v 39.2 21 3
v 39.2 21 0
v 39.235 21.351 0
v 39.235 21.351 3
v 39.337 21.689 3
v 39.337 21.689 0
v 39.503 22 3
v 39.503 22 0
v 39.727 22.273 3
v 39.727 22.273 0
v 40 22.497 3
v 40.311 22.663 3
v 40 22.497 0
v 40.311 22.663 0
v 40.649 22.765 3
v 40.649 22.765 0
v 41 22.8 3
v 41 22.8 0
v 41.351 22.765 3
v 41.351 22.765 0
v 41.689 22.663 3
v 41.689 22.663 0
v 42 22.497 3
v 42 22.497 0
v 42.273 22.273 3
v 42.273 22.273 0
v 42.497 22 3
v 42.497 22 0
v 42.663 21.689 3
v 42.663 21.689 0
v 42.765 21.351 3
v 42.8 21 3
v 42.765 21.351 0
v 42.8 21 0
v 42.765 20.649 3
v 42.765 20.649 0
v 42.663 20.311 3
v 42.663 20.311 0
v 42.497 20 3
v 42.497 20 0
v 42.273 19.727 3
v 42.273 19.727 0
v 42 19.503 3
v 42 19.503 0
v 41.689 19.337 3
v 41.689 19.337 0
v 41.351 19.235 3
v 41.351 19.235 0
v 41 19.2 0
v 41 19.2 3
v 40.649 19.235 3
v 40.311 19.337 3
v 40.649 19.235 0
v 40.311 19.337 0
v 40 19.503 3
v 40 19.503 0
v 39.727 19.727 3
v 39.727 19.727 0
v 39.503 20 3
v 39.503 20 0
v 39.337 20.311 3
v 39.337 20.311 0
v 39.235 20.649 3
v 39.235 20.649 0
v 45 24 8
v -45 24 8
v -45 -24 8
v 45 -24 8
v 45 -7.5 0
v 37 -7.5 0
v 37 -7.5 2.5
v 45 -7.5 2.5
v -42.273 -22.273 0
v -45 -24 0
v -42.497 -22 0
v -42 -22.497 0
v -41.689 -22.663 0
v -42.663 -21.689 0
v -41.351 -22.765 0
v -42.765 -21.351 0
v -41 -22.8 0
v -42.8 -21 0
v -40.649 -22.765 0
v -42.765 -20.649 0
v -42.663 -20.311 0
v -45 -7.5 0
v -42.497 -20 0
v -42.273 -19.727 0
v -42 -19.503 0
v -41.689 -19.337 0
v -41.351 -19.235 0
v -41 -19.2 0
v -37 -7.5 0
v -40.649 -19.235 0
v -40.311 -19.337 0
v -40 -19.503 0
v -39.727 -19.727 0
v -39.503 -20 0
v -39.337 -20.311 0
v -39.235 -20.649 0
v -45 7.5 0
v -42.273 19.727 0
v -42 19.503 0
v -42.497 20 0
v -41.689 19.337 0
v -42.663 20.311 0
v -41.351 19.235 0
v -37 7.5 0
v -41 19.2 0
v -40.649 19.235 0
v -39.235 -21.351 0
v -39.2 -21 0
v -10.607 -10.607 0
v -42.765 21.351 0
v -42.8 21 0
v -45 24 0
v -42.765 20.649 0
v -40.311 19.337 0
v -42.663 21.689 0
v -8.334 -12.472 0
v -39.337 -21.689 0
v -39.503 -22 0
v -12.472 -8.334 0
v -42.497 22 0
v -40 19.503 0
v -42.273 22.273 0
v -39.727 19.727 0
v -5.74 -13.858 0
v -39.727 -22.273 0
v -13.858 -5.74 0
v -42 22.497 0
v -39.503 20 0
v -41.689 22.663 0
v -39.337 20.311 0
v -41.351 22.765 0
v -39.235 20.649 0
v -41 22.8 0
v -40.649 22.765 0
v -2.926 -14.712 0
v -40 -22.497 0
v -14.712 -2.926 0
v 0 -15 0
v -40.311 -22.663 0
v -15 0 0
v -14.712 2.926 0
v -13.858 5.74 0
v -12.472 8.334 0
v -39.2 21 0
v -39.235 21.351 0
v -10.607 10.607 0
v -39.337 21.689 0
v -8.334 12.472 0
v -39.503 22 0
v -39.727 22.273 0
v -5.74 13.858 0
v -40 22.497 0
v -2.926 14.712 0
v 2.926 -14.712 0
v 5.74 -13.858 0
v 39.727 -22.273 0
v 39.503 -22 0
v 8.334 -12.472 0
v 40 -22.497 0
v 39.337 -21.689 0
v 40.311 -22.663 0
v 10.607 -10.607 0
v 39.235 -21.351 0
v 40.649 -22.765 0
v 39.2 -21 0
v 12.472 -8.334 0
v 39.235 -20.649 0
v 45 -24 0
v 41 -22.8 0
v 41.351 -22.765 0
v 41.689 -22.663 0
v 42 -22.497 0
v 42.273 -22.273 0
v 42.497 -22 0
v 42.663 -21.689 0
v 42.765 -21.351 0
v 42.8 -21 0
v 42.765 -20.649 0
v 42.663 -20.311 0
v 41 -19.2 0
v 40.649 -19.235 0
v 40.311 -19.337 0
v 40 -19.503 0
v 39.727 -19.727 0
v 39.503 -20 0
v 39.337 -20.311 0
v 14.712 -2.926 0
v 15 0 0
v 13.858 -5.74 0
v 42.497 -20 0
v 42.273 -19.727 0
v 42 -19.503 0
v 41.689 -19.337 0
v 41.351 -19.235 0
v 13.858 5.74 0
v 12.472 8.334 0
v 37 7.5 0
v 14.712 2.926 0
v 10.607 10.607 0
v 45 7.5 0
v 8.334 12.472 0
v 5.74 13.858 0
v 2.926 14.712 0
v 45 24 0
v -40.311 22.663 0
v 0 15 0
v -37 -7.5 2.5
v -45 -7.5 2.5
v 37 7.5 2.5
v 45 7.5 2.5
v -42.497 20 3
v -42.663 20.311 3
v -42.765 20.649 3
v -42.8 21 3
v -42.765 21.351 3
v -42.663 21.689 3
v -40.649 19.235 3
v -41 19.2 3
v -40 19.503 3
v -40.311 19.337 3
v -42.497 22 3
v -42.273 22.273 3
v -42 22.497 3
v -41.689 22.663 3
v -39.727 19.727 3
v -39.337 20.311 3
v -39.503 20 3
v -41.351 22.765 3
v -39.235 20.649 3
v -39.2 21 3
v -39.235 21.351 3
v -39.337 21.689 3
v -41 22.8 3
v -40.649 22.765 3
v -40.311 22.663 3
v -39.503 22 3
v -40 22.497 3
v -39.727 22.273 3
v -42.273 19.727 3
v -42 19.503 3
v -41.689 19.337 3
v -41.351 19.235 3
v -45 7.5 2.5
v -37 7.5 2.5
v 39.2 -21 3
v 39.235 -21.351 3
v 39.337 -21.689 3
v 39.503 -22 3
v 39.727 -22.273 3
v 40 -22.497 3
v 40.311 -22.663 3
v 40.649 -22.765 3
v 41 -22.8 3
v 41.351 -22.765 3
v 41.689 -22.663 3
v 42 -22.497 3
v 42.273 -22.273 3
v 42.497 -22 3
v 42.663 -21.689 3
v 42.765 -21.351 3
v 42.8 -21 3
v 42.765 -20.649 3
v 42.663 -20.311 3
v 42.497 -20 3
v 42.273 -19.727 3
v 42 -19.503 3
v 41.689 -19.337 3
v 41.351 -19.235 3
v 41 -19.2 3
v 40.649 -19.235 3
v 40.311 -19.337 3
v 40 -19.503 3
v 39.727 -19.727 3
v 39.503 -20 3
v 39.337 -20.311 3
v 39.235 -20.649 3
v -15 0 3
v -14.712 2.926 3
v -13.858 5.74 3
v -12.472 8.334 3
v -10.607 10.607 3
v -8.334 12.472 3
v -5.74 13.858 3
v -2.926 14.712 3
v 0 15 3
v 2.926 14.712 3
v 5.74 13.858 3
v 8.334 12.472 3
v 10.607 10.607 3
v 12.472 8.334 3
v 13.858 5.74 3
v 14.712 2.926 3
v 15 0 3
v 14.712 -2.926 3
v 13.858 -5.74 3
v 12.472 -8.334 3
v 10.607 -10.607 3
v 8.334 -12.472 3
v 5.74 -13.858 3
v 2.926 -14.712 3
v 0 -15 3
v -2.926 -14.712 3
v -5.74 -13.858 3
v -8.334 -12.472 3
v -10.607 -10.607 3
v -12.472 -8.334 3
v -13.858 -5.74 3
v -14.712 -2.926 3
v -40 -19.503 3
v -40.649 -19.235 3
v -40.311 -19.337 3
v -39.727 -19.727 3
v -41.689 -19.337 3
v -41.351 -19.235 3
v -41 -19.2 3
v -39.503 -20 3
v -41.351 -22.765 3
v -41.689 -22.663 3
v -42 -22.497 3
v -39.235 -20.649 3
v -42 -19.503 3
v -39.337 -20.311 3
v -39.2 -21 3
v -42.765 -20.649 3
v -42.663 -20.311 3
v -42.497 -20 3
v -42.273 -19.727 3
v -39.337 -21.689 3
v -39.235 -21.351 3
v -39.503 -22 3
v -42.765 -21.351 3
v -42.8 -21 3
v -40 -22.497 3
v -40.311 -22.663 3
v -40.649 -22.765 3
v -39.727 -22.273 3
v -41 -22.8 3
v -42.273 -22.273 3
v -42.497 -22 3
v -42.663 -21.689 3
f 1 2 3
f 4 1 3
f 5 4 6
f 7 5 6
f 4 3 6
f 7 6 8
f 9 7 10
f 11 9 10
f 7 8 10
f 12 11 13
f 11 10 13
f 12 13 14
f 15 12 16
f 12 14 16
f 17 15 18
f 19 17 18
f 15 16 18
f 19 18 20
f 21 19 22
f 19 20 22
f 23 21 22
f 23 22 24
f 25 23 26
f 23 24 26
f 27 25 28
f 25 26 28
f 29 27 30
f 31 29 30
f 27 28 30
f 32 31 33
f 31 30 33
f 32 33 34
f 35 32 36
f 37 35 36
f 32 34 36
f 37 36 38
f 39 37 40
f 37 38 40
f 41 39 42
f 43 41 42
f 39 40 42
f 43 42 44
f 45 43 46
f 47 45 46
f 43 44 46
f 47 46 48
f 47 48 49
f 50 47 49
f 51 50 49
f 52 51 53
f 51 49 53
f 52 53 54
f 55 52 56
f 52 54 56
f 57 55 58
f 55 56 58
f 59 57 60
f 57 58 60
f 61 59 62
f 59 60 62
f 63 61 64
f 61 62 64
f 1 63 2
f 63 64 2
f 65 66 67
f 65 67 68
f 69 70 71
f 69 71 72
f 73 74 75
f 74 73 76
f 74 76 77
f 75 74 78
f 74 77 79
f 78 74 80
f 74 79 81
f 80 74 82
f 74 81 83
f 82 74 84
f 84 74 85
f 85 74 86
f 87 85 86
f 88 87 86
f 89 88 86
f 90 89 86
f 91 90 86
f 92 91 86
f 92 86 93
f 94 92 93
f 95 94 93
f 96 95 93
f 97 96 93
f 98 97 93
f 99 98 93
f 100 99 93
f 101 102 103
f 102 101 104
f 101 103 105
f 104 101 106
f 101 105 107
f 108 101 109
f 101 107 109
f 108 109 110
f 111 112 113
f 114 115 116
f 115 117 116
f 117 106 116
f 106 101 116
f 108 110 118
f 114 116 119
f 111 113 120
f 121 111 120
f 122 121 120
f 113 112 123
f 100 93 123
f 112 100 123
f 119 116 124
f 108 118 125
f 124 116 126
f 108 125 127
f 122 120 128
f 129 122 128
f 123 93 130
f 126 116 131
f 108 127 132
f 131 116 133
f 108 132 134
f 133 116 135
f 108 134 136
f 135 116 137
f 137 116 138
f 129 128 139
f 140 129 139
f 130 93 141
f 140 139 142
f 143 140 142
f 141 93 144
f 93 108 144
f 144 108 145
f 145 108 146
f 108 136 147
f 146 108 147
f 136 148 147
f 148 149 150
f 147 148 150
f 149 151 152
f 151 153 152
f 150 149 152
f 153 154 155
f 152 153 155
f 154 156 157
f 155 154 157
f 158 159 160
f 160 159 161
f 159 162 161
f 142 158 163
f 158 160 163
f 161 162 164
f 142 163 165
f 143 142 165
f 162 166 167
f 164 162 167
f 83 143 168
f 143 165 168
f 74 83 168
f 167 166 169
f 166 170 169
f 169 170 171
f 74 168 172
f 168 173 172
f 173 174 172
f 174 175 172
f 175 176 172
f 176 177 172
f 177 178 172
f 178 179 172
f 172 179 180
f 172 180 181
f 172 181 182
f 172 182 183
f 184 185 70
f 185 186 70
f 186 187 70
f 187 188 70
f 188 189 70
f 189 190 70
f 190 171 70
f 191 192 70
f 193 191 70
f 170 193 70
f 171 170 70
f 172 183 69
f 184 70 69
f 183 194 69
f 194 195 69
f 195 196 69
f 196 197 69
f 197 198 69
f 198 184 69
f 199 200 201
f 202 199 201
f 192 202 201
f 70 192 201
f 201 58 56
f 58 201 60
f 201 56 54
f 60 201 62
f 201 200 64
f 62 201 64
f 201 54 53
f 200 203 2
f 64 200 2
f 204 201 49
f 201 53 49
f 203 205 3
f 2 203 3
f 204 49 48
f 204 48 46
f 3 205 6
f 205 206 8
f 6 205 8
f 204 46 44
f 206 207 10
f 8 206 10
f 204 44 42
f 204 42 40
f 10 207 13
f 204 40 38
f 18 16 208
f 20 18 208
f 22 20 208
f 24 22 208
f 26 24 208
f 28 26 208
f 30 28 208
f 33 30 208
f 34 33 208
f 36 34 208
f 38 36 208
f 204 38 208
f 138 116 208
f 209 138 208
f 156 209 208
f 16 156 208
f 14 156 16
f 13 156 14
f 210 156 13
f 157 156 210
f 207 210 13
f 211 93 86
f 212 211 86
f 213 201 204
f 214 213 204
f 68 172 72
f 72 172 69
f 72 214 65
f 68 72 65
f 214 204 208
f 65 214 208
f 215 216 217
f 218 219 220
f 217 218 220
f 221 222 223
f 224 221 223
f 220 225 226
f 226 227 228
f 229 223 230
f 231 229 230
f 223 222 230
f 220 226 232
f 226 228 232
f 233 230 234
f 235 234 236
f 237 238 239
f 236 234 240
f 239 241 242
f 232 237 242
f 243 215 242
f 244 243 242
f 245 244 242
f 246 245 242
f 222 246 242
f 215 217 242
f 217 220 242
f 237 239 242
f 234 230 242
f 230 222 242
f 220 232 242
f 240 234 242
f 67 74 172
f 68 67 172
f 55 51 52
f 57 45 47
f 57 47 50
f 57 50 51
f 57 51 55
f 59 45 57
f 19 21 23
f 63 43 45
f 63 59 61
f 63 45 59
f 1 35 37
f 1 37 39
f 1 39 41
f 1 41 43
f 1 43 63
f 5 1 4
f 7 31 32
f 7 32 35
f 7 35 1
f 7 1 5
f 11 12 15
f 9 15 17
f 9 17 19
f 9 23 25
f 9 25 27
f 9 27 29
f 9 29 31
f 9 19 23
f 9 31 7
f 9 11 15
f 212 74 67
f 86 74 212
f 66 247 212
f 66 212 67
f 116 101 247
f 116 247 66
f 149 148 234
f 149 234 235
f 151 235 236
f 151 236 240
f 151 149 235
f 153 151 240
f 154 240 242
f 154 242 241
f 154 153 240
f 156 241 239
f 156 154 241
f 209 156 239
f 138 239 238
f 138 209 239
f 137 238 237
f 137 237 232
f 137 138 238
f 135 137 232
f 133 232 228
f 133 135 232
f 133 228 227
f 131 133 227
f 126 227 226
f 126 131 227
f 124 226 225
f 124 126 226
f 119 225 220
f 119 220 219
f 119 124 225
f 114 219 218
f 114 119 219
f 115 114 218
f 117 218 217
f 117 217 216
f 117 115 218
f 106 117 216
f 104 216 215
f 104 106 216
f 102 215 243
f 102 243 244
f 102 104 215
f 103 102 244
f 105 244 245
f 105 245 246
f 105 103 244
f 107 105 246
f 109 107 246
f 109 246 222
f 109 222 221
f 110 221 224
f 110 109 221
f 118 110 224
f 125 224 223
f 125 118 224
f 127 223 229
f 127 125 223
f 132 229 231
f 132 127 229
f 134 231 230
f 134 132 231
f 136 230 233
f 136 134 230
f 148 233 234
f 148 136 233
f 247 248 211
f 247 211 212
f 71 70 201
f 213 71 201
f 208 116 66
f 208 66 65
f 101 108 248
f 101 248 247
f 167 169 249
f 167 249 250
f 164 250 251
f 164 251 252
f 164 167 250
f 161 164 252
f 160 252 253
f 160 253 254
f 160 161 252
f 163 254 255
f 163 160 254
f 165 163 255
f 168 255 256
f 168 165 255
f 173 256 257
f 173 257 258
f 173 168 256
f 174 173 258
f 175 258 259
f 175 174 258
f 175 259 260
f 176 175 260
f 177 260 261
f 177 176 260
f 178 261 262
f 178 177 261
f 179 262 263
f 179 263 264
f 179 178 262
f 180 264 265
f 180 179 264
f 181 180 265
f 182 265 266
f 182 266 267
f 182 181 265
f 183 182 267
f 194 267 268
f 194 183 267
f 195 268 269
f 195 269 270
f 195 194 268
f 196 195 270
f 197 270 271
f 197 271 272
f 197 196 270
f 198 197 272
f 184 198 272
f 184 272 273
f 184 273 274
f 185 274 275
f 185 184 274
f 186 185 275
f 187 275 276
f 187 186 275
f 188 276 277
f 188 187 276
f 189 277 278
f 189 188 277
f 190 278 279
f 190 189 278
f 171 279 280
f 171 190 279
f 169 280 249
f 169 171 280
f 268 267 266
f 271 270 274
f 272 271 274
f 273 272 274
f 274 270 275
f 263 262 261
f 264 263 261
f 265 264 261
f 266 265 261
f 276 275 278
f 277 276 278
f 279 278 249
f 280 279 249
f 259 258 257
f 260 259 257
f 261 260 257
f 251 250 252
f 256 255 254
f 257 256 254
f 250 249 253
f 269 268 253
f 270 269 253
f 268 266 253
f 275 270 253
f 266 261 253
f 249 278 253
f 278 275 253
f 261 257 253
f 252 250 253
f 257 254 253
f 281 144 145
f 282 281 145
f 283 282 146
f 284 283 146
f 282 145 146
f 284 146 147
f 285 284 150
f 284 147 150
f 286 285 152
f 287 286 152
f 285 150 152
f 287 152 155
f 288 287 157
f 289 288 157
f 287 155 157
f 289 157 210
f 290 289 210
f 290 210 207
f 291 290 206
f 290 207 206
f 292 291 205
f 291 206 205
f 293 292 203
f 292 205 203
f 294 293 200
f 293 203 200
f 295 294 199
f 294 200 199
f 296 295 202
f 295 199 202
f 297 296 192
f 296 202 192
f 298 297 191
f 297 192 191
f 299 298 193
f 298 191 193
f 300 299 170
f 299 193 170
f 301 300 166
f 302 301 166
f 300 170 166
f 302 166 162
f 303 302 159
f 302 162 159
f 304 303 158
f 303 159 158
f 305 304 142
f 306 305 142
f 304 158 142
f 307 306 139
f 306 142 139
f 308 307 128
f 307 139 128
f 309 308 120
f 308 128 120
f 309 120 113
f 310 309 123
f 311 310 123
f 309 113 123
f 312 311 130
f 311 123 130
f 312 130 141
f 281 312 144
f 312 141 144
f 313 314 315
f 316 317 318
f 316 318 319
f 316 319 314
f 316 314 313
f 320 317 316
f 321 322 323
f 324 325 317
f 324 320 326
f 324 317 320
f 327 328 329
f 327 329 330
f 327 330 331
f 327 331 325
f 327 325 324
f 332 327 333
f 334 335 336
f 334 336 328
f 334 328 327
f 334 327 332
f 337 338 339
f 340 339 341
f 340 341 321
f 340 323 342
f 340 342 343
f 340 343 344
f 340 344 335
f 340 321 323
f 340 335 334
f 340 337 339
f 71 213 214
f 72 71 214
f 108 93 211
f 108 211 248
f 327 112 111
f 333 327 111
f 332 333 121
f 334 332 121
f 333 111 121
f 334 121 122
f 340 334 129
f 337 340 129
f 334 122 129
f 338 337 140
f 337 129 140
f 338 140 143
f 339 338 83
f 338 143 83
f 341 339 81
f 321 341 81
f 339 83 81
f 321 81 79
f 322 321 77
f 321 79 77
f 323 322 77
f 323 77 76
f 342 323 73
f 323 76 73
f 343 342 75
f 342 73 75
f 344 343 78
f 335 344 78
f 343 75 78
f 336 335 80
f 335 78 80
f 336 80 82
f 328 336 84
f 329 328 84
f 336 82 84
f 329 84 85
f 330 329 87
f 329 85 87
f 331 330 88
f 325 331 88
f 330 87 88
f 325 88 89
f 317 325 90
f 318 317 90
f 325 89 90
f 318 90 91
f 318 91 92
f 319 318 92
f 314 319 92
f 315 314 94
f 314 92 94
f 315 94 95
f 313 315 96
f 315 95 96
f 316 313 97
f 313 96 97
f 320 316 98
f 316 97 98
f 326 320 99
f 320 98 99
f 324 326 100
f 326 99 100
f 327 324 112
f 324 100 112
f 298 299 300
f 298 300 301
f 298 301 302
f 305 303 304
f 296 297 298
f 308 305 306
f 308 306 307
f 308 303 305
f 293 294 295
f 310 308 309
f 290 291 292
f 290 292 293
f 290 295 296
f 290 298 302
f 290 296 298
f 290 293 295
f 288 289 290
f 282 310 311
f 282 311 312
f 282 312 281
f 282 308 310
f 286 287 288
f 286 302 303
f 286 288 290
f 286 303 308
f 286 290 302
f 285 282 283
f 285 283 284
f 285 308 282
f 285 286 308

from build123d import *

# Parameters (mm, degrees)
SKETCH_1_W               = 90
SKETCH_1_H               = 48
EXTRUDE_1_DEPTH          = 8
SKETCH_4_R               = 15
CUT_EXTRUDE_3_DEPTH      = 3
SKETCH_5_R               = 1.8
CUT_EXTRUDE_4_DEPTH      = 3
MIRROR_2_COPY_1_SKETCH_R = 1.8
MIRROR_2_COPY_1_DEPTH    = 3
SKETCH_6_W               = 16
SKETCH_6_H               = 15
CUT_EXTRUDE_5_DEPTH      = 2.5


with BuildPart() as part:
    # 草图1 → 凸台-拉伸1 (new body)
    with BuildSketch(Plane.XY):
        Rectangle(SKETCH_1_W, SKETCH_1_H)
    extrude(amount=EXTRUDE_1_DEPTH)

    # 草图4 → 切除-拉伸3 (cut)
    with BuildSketch(Plane(origin=(0, 0, 0), x_dir=(-1, 0, 0), z_dir=(0, 0, -1))):
        Circle(SKETCH_4_R)
    extrude(amount=-CUT_EXTRUDE_3_DEPTH, mode=Mode.SUBTRACT)

    # 草图5 → 切除-拉伸4 (cut)
    with BuildSketch(Plane(origin=(0, 0, 0), x_dir=(-1, 0, 0), z_dir=(0, 0, -1))):
        with Locations((-41, 21)):
            Circle(SKETCH_5_R)
    cut_extrude_4 = extrude(amount=-CUT_EXTRUDE_4_DEPTH, mode=Mode.SUBTRACT)

    # 镜向1: 切除-拉伸4 across plane
    add(cut_extrude_4.mirror(Plane.ZX), mode=Mode.SUBTRACT)

    # 镜向2: 切除-拉伸4 across plane
    add(cut_extrude_4.mirror(Plane(origin=(0, 0, 0), x_dir=(0, 0, 1), z_dir=(1, 0, 0))), mode=Mode.SUBTRACT)

    # 镜向2 copy 1 sketch → 镜向2 copy 1 (cut)
    with BuildSketch(Plane(origin=(0, 0, 0), x_dir=(1, 0, 0), z_dir=(0, 0, -1))):
        with Locations((-41, 21)):
            Circle(MIRROR_2_COPY_1_SKETCH_R)
    extrude(amount=-MIRROR_2_COPY_1_DEPTH, mode=Mode.SUBTRACT)

    # 草图6 → 切除-拉伸5 (cut)
    with BuildSketch(Plane(origin=(0, 0, 0), x_dir=(-1, 0, 0), z_dir=(0, 0, -1))):
        with Locations((45, 0)):
            Rectangle(SKETCH_6_W, SKETCH_6_H)
    cut_extrude_5 = extrude(amount=-CUT_EXTRUDE_5_DEPTH, mode=Mode.SUBTRACT)

    # 镜向3: 切除-拉伸5 across plane
    add(cut_extrude_5.mirror(Plane(origin=(0, 0, 0), x_dir=(0, 0, 1), z_dir=(1, 0, 0))), mode=Mode.SUBTRACT)


solid = part.part
